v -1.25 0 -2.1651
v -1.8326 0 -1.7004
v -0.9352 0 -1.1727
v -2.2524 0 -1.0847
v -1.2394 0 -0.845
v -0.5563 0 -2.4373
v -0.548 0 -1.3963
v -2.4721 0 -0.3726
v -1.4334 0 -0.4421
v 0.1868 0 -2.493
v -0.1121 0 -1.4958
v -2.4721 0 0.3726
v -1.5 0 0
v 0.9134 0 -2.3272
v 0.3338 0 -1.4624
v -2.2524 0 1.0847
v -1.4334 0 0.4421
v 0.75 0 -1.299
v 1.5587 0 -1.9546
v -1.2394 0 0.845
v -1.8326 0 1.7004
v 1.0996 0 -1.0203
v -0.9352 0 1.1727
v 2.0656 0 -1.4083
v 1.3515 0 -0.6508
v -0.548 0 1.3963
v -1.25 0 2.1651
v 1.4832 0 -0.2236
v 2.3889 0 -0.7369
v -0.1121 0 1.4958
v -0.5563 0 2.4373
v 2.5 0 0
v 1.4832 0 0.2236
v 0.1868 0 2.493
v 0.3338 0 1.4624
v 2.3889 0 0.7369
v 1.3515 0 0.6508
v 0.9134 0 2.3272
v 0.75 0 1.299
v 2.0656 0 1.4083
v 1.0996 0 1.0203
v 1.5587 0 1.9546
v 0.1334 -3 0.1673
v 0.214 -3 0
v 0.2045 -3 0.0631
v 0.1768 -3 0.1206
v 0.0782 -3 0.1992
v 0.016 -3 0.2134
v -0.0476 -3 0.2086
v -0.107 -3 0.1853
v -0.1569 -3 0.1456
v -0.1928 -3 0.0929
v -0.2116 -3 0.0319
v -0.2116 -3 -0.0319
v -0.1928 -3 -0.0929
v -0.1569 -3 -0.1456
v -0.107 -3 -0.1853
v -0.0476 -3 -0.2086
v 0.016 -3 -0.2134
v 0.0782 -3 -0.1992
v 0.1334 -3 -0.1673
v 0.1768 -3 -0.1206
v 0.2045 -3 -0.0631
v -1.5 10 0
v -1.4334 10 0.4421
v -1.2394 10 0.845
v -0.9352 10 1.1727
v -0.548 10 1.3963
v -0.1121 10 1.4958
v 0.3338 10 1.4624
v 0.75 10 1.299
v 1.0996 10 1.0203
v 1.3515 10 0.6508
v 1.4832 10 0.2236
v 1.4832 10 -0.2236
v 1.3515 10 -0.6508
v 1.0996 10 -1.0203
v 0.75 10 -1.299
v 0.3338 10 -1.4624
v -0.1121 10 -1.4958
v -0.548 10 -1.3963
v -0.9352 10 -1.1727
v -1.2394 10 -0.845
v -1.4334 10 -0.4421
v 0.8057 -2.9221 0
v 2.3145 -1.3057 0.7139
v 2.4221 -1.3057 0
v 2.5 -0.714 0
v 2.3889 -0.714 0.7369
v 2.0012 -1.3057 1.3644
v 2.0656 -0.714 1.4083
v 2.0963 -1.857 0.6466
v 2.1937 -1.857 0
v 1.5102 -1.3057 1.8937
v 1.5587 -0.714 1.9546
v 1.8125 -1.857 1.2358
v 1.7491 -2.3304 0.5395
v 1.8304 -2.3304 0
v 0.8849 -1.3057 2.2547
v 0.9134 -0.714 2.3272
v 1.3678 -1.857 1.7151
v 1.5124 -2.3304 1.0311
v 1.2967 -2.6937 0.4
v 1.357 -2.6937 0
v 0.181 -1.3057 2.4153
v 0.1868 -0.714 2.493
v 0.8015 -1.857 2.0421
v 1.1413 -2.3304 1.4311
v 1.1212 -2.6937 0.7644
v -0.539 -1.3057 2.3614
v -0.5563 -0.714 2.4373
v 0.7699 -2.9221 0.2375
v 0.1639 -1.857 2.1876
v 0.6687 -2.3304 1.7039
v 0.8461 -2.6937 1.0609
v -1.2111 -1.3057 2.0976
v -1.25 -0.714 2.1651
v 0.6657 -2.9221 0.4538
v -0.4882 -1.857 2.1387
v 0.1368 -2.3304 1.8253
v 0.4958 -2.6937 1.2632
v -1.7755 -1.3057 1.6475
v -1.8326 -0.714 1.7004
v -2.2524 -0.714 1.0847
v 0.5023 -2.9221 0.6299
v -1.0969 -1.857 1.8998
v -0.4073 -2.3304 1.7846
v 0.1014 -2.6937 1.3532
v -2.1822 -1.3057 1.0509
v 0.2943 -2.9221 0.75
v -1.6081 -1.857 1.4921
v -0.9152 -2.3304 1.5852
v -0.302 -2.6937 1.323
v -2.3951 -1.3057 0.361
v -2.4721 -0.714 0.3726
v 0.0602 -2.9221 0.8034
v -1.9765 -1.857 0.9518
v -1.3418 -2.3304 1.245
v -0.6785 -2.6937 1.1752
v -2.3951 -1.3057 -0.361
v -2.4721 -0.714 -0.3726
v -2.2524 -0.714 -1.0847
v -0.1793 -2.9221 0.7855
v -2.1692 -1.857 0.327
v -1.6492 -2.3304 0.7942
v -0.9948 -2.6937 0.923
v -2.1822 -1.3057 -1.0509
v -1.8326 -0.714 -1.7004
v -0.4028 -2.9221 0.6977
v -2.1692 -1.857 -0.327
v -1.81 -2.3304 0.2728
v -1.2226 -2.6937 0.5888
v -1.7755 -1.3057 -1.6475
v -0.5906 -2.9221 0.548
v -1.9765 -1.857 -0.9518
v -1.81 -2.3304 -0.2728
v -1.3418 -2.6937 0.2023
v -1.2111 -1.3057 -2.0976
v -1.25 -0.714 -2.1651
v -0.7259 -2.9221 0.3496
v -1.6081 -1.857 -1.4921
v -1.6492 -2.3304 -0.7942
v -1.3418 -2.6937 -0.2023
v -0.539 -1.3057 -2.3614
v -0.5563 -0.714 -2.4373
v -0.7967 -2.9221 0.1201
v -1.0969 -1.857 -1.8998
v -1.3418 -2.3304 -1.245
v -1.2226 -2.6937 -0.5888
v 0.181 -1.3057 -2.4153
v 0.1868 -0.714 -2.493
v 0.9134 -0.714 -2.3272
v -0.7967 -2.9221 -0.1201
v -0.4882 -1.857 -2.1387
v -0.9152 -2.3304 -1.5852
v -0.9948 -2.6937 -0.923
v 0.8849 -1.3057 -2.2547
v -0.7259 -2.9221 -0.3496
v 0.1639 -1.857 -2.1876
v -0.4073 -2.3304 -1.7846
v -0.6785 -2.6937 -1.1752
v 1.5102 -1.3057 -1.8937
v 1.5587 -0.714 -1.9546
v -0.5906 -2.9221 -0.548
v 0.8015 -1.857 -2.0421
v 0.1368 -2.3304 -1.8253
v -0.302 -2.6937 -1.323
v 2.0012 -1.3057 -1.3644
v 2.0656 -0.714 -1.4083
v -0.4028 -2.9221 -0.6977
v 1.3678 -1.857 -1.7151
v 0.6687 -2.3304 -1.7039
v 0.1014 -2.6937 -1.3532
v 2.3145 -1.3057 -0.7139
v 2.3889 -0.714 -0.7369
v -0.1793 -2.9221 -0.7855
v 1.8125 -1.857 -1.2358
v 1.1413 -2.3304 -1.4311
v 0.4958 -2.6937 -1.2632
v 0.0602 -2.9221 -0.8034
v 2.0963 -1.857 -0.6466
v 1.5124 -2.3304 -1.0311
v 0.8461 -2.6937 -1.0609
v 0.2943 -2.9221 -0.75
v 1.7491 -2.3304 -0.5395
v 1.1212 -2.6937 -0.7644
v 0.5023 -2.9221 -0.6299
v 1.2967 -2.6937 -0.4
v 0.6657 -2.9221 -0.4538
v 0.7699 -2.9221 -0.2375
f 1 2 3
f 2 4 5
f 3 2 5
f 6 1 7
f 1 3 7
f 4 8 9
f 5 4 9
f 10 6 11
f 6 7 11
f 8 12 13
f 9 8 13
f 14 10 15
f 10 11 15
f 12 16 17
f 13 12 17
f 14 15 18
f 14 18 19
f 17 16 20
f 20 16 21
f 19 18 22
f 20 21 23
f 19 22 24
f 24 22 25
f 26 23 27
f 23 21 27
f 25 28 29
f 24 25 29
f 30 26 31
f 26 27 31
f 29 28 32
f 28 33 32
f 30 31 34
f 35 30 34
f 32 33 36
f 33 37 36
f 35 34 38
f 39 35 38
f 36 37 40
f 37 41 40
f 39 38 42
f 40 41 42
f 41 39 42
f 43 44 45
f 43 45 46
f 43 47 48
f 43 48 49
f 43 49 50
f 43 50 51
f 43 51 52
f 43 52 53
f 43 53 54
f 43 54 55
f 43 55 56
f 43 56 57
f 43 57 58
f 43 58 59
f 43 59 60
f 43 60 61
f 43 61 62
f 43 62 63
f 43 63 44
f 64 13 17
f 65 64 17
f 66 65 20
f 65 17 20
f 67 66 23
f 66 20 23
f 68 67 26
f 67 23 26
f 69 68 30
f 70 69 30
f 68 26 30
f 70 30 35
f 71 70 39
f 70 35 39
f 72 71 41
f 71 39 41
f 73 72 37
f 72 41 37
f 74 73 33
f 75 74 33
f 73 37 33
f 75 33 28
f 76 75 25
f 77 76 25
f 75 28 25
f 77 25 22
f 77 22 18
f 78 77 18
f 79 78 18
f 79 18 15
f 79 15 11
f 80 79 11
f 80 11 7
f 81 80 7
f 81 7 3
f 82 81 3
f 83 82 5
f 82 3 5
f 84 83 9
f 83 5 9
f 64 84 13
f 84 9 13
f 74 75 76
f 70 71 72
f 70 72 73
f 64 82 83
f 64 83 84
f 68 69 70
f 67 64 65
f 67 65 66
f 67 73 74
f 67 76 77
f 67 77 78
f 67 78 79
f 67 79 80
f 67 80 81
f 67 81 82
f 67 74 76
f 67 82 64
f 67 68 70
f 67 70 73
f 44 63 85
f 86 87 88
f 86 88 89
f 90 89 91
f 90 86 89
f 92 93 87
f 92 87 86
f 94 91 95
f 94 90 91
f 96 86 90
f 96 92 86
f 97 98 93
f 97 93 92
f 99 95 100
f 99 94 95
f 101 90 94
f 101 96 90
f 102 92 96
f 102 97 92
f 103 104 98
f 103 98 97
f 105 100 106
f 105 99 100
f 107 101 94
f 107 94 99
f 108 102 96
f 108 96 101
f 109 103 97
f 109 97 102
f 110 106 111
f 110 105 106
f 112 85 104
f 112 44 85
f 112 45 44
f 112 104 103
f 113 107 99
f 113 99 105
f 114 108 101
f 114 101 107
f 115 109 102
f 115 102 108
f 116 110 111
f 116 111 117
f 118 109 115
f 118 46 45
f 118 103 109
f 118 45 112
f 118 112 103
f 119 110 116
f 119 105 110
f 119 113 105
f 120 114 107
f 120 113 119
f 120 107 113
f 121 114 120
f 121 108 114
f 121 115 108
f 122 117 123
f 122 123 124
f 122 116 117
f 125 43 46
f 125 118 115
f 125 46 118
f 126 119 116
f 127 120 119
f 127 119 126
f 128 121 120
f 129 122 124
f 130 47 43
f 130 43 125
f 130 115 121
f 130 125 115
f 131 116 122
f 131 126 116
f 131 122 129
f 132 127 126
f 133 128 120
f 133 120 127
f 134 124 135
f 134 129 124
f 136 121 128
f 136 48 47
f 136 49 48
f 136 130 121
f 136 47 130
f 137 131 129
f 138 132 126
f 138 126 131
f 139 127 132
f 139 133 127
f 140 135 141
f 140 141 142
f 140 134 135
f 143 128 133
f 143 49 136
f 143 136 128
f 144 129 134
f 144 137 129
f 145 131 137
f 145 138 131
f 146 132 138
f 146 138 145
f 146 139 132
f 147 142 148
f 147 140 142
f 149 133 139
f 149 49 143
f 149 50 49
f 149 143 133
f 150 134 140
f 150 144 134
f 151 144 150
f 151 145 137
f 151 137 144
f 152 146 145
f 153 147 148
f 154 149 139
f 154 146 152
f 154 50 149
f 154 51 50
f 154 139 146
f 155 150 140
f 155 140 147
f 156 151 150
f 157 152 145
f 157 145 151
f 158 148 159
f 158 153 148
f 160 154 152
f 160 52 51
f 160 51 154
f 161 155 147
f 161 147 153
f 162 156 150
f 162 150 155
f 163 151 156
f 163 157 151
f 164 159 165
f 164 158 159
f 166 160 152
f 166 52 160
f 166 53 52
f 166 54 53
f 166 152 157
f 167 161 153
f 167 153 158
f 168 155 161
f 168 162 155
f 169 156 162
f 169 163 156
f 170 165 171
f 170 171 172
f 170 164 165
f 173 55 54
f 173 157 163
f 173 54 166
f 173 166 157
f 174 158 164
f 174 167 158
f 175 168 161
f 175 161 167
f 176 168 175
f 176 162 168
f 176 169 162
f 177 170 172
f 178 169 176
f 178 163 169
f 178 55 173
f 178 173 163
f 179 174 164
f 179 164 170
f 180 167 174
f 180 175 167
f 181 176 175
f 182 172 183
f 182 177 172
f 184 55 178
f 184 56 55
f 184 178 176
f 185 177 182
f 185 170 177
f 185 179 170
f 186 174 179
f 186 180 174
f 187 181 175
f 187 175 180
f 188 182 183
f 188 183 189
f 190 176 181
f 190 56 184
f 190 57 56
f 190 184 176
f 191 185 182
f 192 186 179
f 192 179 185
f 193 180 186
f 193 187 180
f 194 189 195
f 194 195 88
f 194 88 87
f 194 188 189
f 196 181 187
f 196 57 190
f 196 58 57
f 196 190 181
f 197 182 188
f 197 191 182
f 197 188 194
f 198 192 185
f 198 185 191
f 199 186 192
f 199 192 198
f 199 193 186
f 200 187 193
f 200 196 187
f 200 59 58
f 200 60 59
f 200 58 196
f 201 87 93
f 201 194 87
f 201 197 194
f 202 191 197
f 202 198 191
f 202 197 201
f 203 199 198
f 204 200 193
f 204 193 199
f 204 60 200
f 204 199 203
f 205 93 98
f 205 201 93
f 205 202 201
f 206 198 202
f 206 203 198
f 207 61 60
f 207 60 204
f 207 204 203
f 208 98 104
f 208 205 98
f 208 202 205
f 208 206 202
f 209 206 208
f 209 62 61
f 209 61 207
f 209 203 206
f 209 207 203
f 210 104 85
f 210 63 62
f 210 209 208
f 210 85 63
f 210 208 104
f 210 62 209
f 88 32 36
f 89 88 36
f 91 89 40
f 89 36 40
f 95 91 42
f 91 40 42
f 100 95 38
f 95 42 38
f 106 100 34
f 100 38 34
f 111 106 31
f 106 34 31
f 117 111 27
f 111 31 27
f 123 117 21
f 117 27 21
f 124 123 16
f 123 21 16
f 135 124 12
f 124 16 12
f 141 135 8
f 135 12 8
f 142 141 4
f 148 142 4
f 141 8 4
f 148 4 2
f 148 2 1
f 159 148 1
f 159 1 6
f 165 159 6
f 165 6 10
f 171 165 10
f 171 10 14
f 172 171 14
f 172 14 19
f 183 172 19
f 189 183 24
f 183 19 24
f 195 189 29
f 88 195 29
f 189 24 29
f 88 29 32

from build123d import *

# Parameters (mm, degrees)
F0_R     = 2.5
F1_DEPTH = 3
F2_R     = 1.5
F3_DEPTH = 10
F4_R     = 2.286


with BuildPart() as f1:
    # F0 (on Front) → F1 (new body)
    with BuildSketch(Plane.XZ):
        Circle(F0_R)
    extrude(amount=F1_DEPTH)

    # F2 (on face) → F3 (join)
    with BuildSketch(Plane(origin=(0, 0, 0), x_dir=(-1, 0, 0), z_dir=(0, 1, 0))):
        Circle(F2_R)
    extrude(amount=F3_DEPTH)

    # F4
    f4_edges = [f1.edges().sort_by_distance(p)[0] for p in [
        (-2.5, -3, 0),
    ]]
    fillet(f4_edges, radius=F4_R)


solid = f1.part
